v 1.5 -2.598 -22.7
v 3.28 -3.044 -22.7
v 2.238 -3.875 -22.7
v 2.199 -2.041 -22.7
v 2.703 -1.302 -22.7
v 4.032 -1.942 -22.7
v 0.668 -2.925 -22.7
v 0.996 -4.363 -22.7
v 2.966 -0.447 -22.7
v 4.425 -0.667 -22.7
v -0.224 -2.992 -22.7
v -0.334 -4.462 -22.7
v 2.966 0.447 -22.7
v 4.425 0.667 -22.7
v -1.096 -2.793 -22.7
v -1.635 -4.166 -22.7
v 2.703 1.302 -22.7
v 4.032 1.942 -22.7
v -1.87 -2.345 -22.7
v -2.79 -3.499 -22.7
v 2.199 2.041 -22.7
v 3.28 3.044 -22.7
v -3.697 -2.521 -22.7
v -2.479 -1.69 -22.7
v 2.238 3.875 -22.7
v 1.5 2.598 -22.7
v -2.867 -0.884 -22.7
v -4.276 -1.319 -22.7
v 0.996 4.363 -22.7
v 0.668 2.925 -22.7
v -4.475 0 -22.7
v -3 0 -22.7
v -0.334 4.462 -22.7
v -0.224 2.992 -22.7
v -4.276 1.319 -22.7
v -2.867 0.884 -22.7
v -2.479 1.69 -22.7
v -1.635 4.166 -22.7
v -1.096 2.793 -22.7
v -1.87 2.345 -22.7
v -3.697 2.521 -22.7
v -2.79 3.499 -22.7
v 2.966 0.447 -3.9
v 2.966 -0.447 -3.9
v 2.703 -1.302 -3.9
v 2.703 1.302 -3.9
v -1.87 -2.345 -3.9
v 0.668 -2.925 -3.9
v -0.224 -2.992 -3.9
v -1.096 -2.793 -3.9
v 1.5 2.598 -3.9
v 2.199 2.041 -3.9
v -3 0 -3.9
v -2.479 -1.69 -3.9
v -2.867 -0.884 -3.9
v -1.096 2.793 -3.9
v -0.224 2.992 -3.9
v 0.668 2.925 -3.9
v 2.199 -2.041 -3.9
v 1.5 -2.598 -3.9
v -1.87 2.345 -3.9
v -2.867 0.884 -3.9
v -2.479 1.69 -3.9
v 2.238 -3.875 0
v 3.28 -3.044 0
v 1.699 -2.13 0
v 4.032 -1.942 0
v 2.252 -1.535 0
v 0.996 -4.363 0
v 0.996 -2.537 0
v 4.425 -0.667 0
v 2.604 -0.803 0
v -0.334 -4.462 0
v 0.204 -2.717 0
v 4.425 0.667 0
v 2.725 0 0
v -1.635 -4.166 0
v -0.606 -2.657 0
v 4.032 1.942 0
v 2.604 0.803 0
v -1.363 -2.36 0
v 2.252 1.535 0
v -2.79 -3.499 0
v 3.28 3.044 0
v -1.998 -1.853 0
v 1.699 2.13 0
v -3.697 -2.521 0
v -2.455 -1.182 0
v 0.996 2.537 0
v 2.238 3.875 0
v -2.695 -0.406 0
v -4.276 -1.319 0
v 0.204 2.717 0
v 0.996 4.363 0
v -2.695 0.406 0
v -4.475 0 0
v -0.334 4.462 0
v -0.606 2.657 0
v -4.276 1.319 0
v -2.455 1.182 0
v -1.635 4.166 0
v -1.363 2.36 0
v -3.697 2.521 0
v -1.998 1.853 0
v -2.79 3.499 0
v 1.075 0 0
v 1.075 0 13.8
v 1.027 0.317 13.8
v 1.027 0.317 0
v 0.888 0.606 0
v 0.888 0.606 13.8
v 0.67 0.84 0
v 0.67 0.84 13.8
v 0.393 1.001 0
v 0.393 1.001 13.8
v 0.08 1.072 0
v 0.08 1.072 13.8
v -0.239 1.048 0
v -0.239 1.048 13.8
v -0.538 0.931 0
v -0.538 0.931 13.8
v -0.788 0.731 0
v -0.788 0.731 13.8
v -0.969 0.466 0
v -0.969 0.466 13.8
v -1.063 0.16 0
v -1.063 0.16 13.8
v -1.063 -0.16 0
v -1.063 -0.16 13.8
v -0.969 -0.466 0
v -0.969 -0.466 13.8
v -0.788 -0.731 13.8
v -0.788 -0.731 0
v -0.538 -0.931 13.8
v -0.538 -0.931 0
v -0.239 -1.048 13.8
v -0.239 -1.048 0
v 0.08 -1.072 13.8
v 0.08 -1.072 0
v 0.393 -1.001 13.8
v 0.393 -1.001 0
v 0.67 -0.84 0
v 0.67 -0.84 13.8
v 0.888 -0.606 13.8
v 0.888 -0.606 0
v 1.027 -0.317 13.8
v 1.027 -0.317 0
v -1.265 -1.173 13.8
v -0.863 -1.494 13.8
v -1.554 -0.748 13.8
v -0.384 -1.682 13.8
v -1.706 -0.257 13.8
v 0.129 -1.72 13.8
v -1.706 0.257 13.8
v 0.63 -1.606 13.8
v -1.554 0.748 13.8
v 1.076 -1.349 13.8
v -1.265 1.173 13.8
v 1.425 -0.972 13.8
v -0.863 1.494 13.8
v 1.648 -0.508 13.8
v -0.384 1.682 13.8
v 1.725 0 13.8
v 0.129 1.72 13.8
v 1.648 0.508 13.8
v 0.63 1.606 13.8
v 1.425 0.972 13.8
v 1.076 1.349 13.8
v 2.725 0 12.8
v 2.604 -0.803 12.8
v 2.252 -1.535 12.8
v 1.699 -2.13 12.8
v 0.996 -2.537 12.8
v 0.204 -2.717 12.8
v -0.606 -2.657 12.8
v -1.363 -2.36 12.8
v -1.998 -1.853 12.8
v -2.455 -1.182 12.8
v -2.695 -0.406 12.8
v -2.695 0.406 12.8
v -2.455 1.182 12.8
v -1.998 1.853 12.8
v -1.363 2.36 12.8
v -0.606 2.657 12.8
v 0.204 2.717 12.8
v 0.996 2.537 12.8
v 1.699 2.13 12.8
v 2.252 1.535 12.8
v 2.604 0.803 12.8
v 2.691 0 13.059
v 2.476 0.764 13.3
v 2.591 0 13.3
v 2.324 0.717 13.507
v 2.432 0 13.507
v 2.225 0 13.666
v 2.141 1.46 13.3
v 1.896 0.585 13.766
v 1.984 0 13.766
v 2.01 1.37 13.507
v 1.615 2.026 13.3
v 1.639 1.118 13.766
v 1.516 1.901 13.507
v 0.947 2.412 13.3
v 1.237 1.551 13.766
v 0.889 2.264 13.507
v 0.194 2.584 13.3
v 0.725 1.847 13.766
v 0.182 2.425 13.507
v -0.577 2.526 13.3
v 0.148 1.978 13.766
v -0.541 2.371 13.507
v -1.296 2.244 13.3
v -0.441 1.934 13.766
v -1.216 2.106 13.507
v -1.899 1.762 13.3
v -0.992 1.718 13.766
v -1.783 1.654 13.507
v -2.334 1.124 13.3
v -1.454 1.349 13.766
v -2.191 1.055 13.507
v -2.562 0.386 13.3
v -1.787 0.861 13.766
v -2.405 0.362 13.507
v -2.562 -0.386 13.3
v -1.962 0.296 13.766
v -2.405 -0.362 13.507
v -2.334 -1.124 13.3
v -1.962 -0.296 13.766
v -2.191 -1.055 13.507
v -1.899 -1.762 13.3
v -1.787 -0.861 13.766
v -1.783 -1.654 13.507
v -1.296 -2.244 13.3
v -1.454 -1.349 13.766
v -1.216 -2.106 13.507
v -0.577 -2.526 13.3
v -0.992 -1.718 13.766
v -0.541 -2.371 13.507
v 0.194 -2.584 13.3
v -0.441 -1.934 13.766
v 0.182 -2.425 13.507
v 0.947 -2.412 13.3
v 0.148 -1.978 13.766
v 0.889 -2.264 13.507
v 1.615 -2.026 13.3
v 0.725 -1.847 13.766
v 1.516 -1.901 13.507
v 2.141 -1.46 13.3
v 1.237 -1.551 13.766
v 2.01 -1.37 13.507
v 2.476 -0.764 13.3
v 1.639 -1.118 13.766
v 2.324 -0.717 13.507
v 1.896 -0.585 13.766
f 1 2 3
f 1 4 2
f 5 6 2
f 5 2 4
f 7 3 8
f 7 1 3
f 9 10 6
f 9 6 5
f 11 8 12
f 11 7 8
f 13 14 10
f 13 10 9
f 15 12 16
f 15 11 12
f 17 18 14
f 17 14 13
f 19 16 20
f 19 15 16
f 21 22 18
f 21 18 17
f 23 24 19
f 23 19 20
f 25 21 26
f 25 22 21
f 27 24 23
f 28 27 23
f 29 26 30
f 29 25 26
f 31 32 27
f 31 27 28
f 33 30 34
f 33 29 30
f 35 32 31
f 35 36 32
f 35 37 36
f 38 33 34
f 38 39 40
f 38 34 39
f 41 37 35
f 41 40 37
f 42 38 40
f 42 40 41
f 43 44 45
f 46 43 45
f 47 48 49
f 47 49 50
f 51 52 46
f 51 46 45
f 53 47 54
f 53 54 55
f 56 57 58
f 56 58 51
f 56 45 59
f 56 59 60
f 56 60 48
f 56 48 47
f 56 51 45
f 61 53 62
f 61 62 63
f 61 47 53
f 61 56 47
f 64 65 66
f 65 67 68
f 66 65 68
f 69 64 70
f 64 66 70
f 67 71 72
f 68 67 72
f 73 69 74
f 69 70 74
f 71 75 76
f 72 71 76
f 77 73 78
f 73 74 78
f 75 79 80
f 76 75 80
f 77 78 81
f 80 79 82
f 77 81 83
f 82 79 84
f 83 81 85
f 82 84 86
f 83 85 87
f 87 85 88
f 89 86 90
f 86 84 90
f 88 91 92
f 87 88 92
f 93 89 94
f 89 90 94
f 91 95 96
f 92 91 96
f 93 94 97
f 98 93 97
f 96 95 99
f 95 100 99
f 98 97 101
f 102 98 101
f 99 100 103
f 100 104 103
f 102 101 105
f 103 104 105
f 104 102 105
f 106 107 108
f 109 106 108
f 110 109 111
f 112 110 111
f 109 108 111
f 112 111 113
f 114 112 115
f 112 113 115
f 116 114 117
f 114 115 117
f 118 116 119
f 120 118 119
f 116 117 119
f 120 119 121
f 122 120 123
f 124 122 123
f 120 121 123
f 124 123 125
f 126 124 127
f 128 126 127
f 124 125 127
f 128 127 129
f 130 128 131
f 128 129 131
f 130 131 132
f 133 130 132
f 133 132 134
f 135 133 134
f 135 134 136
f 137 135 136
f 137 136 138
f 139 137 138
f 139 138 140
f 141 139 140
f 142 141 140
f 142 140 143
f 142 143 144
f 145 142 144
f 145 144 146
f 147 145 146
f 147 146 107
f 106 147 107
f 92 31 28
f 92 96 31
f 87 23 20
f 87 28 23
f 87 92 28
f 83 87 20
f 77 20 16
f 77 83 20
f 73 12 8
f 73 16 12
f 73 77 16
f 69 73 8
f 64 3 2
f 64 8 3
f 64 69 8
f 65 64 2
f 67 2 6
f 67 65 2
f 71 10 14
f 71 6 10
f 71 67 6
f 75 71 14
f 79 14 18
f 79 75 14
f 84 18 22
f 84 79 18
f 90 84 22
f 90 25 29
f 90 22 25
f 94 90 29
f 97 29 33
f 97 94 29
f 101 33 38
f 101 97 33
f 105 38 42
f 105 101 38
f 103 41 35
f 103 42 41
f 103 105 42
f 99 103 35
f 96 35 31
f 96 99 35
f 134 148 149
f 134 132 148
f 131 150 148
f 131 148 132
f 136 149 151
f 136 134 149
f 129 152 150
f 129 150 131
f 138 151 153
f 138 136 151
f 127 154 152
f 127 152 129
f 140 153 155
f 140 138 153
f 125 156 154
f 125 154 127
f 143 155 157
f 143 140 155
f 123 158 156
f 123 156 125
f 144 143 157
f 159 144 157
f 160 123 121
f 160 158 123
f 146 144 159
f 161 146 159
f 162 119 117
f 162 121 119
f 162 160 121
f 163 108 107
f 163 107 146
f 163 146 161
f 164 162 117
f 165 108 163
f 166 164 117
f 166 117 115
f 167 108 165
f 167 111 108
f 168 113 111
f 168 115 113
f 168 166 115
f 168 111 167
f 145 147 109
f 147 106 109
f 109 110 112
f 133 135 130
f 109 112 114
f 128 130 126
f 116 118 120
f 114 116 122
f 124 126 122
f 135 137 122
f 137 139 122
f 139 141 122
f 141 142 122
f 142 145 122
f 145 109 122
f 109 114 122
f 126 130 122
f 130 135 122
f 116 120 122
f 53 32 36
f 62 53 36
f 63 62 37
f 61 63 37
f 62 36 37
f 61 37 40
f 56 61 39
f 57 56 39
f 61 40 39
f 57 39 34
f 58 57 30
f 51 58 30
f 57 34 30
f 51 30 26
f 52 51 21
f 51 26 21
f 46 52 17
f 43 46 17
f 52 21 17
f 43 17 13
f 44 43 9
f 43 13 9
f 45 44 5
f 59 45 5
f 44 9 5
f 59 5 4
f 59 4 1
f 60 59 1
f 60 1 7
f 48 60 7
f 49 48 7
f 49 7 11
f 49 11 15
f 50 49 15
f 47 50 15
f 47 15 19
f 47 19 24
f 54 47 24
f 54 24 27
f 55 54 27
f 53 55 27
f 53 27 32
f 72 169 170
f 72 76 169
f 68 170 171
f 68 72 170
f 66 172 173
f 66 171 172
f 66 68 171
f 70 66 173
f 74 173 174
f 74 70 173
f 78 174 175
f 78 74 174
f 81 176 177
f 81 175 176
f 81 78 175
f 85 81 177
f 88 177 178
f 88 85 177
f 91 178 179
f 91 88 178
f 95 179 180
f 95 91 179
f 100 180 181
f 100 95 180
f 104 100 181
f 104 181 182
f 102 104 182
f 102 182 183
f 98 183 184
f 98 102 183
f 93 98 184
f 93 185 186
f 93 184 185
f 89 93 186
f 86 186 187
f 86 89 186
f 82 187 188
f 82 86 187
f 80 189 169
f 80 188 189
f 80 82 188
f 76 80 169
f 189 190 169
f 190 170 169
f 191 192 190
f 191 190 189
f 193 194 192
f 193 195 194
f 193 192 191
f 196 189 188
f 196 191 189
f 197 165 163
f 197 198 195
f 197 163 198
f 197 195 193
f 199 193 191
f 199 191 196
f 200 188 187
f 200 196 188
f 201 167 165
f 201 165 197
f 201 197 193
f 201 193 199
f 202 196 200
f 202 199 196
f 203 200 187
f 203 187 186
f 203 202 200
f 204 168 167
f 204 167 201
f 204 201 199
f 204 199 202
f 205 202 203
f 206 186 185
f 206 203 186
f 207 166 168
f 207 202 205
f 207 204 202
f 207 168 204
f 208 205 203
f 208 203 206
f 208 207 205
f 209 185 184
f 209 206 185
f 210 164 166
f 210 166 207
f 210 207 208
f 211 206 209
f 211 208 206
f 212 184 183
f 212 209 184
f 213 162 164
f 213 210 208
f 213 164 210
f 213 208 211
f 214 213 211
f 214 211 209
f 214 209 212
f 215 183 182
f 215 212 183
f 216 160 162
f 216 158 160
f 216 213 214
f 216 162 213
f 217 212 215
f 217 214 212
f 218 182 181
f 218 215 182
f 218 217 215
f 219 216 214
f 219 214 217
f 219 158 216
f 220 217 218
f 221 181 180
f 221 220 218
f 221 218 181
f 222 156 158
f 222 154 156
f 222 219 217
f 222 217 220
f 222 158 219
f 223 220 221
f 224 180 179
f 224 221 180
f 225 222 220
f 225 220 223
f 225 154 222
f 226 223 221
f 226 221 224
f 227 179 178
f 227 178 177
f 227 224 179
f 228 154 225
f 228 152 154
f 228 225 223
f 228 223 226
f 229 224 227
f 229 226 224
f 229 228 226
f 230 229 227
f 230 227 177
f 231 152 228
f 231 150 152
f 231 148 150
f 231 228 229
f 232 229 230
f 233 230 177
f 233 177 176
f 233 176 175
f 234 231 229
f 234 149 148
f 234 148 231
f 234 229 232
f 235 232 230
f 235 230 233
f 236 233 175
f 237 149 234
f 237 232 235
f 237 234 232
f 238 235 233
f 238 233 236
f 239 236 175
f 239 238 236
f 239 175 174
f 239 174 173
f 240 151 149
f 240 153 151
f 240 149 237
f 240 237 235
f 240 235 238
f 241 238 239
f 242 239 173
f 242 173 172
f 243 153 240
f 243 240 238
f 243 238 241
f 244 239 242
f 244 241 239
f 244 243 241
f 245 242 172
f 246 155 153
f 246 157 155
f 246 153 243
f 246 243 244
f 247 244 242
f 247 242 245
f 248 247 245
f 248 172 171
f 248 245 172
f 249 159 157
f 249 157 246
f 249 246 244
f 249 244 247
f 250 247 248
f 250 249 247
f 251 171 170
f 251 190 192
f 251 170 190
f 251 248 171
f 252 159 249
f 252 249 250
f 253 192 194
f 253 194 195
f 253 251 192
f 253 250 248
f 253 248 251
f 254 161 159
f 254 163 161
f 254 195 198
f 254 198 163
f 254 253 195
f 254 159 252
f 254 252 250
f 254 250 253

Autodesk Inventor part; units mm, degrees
ref_plane "YZ Plane" through (0, 0, 0) normal (1, 0, 0) x (0, 1, 0)
ref_plane "XZ Plane" through (0, 0, 0) normal (0, 1, 0) x (-1, 0, 0)
ref_plane "XY Plane" through (0, 0, 0) normal (0, 0, 1) x (1, 0, 0)
sketch "스케치1" plane through (0, 0, 0) normal (0, 0, 1) x (1, 0, 0)
  circle A0 centre (0, 0) radius 2.725
  dimension "d0" = 5.45
extrude "돌출1" add sketch "스케치1" along normal blind 13.8
sketch "스케치2" plane through (0, 0, 13.8) normal (0, 0, 1) x (1, 0, 0)
  circle A0 centre (0, 0) radius 1.075
  dimension "d3" = 2.15
extrude "돌출2" cut sketch "스케치2" against normal blind 20.45
fillet "모깎기1" radius 1 1 edges at (-2.725, 0, 13.8)
sketch "스케치3" plane through (0, 0, 0) normal (0, 0, -1) x (-1, 0, 0)
  circle A0 centre (0, 0) radius 4.475
  dimension "d7" = 8.95
extrude "돌출3" add sketch "스케치3" along normal blind 22.7
sketch "스케치4" plane through (0, 0, -22.7) normal (0, 0, -1) x (-1, 0, 0)
  circle A0 centre (0, 0) radius 1.075 projected
  circle A1 centre (0, 0) radius 3
  dimension "d10" = 6
extrude "돌출4" cut sketch "스케치4" against normal blind 18.8 contours A0 | A1
properties part number "DC_PLUG"
